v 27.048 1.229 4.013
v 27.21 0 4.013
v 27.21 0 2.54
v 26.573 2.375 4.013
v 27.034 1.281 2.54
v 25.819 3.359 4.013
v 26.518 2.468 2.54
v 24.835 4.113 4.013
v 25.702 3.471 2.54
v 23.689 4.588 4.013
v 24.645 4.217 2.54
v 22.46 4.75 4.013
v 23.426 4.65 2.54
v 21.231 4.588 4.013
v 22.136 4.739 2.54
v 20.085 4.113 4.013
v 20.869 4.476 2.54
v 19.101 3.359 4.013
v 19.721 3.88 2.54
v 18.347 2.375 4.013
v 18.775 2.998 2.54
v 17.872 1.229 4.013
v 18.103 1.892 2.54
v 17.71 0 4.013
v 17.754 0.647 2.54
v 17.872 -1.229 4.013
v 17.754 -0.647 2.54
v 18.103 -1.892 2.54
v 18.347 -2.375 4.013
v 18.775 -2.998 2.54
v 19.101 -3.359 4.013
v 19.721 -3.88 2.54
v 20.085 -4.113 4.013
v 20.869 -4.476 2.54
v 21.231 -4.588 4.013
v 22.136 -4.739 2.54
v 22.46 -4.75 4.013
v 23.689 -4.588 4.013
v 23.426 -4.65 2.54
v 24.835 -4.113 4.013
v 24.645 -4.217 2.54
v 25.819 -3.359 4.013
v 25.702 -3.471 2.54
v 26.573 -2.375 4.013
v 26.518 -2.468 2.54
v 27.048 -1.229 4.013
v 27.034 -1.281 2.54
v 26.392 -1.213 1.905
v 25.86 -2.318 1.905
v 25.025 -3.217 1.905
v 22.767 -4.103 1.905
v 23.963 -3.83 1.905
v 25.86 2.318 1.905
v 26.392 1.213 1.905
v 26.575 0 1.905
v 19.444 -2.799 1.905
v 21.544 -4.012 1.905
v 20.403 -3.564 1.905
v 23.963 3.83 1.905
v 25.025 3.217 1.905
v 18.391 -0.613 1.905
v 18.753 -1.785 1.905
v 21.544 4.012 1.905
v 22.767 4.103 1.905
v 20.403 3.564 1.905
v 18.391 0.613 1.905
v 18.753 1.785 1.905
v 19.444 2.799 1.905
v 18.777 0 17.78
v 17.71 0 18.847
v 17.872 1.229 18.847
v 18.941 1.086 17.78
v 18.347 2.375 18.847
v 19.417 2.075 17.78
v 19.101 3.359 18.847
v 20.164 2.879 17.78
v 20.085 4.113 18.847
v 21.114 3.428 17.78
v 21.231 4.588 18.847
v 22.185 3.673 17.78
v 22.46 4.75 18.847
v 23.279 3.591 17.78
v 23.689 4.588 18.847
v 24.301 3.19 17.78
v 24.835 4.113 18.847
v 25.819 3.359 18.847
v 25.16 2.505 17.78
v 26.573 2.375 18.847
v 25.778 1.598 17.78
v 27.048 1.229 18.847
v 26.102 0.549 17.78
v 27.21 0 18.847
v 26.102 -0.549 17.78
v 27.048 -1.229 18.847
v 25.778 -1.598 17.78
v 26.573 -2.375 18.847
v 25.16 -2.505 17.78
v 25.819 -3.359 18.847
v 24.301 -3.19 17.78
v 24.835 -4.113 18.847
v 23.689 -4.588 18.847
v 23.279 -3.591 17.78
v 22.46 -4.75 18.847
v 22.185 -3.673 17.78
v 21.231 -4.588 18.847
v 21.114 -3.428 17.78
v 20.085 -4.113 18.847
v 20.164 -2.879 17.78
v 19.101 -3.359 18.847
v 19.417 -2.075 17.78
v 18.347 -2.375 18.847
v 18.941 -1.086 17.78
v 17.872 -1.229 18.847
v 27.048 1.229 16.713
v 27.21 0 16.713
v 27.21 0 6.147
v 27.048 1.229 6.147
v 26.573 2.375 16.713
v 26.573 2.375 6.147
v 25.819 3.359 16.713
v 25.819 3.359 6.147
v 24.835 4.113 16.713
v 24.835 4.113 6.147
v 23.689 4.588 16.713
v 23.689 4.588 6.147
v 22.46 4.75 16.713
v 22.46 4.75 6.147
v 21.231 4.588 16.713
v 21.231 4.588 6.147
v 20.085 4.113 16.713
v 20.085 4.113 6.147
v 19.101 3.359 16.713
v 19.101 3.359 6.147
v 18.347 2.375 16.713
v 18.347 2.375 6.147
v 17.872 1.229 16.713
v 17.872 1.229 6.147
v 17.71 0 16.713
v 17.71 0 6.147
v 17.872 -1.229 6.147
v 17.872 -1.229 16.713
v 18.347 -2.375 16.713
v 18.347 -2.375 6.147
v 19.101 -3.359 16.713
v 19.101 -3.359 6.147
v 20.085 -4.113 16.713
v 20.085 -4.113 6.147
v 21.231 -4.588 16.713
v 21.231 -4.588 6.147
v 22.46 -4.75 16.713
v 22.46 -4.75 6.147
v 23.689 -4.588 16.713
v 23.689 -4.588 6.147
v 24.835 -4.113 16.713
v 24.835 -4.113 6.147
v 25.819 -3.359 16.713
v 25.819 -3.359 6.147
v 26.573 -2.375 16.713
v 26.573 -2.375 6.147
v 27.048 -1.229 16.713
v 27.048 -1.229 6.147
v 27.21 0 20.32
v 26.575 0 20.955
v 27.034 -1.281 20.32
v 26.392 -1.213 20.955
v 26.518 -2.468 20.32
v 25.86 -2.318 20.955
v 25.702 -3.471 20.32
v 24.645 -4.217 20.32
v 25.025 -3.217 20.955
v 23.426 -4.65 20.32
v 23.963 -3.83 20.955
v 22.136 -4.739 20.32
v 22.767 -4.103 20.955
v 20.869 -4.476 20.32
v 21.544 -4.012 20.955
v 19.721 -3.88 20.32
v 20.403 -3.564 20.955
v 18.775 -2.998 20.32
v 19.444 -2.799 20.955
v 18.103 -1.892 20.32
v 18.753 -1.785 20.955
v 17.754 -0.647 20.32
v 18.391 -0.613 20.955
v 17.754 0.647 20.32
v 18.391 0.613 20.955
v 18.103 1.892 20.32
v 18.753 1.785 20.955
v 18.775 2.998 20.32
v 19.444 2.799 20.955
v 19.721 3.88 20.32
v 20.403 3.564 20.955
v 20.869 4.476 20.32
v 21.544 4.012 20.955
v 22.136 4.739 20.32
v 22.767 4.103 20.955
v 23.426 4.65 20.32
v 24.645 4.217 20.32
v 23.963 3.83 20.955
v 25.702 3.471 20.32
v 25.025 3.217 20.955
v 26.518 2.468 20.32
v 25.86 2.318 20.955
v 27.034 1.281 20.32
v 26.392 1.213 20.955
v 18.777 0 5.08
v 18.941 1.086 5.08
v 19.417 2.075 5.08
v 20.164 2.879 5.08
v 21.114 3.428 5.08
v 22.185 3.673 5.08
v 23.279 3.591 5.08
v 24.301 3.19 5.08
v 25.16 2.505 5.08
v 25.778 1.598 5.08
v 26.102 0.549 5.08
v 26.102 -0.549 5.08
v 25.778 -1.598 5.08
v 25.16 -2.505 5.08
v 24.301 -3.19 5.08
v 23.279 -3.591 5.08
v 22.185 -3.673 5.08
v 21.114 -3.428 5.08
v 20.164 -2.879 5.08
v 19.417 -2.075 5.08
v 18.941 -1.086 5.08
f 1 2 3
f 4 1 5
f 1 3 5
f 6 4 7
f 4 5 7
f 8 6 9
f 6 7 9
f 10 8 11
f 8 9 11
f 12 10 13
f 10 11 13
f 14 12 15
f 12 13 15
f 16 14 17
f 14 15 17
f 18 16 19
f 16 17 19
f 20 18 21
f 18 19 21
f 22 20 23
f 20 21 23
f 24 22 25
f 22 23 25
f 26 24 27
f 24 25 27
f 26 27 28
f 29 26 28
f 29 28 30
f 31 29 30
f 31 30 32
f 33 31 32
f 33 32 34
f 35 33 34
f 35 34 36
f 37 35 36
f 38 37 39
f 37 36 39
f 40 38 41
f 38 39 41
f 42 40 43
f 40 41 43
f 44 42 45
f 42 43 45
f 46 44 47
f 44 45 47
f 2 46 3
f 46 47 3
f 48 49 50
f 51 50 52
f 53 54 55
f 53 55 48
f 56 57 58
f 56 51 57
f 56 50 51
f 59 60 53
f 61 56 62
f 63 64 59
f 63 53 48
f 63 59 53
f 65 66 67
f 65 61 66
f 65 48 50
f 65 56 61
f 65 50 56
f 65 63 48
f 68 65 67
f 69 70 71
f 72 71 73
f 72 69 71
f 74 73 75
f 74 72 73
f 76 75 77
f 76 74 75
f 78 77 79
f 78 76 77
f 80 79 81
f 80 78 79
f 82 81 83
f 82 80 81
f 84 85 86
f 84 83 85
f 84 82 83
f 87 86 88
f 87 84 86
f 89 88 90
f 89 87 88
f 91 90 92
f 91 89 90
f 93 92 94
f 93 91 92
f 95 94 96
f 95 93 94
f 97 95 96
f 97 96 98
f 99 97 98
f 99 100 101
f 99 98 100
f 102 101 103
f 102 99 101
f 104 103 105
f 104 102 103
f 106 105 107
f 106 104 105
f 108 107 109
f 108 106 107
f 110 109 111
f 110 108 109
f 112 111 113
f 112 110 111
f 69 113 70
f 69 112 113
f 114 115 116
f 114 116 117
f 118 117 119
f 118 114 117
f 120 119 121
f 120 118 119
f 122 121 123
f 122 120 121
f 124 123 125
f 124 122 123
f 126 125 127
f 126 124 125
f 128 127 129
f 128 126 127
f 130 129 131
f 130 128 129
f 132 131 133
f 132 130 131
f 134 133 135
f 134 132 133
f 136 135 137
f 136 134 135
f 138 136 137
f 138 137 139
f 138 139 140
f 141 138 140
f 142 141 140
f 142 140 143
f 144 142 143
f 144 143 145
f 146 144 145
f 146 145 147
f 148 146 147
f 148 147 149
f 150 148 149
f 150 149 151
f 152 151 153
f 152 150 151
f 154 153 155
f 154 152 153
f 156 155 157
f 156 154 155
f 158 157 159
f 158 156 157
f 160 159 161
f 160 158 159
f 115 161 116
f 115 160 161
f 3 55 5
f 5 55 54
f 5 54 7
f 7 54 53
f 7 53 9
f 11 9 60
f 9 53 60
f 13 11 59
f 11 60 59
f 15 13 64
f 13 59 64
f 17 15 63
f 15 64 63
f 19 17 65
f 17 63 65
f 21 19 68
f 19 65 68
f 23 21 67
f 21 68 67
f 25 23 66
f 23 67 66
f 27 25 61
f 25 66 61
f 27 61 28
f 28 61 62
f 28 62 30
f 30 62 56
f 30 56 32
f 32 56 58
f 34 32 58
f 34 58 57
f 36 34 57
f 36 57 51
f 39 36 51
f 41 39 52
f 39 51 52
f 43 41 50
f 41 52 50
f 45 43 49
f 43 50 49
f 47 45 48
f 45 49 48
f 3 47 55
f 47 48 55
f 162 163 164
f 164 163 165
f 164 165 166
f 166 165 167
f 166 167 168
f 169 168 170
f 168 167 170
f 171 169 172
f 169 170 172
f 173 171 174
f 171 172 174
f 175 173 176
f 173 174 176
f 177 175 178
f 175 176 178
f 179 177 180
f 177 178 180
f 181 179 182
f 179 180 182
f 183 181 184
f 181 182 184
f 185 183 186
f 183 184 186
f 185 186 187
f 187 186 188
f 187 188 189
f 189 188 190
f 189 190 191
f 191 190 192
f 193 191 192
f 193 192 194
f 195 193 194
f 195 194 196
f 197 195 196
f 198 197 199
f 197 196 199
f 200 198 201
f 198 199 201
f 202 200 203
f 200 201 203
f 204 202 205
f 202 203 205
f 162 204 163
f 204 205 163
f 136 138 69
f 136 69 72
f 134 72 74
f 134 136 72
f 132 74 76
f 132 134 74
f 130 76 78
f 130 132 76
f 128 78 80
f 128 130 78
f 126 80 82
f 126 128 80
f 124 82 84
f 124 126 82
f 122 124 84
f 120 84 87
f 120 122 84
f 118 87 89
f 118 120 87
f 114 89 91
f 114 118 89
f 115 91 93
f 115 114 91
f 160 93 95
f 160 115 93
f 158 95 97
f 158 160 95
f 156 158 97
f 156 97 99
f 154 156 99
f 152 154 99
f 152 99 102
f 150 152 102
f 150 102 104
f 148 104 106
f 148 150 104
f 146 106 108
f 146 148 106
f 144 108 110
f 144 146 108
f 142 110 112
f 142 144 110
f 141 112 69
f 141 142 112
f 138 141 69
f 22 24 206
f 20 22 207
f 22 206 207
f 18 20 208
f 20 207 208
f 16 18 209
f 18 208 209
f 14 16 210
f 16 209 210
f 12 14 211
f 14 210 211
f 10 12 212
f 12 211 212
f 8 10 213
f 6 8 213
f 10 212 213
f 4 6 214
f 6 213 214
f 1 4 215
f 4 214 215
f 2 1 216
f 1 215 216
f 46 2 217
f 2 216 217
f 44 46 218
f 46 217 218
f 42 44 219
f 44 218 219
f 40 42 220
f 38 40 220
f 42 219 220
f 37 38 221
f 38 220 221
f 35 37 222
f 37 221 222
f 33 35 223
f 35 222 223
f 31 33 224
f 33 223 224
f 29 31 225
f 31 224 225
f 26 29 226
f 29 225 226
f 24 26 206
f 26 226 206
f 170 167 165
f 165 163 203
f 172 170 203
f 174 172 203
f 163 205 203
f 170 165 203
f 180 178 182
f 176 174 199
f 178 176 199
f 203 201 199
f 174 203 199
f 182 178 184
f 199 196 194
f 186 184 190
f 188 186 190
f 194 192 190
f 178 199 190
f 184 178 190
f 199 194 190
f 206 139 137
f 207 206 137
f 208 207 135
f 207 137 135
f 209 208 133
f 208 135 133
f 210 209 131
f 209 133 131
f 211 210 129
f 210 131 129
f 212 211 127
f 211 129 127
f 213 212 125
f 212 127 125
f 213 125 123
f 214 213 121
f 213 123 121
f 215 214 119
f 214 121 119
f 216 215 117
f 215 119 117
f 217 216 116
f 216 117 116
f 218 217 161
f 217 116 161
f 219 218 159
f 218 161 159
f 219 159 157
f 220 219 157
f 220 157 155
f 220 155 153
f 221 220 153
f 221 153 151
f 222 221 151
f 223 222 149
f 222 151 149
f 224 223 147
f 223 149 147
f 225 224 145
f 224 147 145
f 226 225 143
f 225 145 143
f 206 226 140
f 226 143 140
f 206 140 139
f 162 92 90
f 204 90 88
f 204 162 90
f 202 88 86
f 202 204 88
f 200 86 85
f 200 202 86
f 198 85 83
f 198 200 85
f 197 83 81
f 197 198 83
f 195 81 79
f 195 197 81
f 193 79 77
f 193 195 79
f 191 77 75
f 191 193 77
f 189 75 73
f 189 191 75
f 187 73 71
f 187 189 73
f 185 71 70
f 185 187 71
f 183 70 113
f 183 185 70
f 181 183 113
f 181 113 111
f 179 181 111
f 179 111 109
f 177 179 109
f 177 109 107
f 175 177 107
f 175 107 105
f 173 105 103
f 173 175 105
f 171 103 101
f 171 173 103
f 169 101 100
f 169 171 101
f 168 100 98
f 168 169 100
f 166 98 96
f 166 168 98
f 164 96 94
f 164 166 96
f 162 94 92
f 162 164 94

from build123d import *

# Parameters (mm, degrees)
SKETCH1_R                = 4.7498
EXTRUDE1_DEPTH           = 11.43
SKETCH3_R                = 4.7498
CUT_EXTRUDE1_DEPTH       = 1.905
CHAMFER1_SIZE            = 0.635
CHAMFER1_OF_MIRROR1_SIZE = 0.635


with BuildPart() as part:
    # Sketch1 → Extrude1 (new body)
    with BuildSketch(Plane.XY):
        with Locations((22.45995, 0)):
            Circle(SKETCH1_R)
    extrude1 = extrude(amount=EXTRUDE1_DEPTH)

    # Sketch2 → Cut-Revolve1 (revolve, cut)
    with BuildSketch(Plane(origin=(0, 0, 0), x_dir=(-1, 0, 0), z_dir=(0, 1, 0))):
        Polygon((-18.77695, 5.08), (-16.87195, 6.985), (-16.87195, 3.175), align=None)
    cut_revolve1 = revolve(axis=Axis((22.45995, 0, 11.43), (0, 0, -1)), mode=Mode.SUBTRACT)

    # Sketch3 → Cut-Extrude1 (cut)
    with BuildSketch(Plane(origin=(0, 0, 0), x_dir=(-1, 0, 0), z_dir=(0, 0, -1))):
        with Locations((-22.45995, 0)):
            Circle(SKETCH3_R)
    cut_extrude1 = extrude(amount=-CUT_EXTRUDE1_DEPTH, mode=Mode.SUBTRACT)

    # Chamfer1
    chamfer1_edges = [part.edges().sort_by_distance(p)[0] for p in [
        (17.71015, 0, 1.905),
    ]]
    chamfer(chamfer1_edges, length=CHAMFER1_SIZE)

    # Mirror1: Extrude1, Cut-Revolve1, Cut-Extrude1 across plane
    add(extrude1.mirror(Plane(origin=(28.80995, -13.97, 11.43), x_dir=(1, 0, 0), z_dir=(0, 0, -1))))
    add(cut_revolve1.mirror(Plane(origin=(28.80995, -13.97, 11.43), x_dir=(1, 0, 0), z_dir=(0, 0, -1))), mode=Mode.SUBTRACT)
    add(cut_extrude1.mirror(Plane(origin=(28.80995, -13.97, 11.43), x_dir=(1, 0, 0), z_dir=(0, 0, -1))), mode=Mode.SUBTRACT)

    # Chamfer1 of Mirror1
    chamfer1_of_mirror1_edges = [part.edges().sort_by_distance(p)[0] for p in [
        (17.71015, 0, 20.955),
    ]]
    chamfer(chamfer1_of_mirror1_edges, length=CHAMFER1_OF_MIRROR1_SIZE)


solid = part.part
